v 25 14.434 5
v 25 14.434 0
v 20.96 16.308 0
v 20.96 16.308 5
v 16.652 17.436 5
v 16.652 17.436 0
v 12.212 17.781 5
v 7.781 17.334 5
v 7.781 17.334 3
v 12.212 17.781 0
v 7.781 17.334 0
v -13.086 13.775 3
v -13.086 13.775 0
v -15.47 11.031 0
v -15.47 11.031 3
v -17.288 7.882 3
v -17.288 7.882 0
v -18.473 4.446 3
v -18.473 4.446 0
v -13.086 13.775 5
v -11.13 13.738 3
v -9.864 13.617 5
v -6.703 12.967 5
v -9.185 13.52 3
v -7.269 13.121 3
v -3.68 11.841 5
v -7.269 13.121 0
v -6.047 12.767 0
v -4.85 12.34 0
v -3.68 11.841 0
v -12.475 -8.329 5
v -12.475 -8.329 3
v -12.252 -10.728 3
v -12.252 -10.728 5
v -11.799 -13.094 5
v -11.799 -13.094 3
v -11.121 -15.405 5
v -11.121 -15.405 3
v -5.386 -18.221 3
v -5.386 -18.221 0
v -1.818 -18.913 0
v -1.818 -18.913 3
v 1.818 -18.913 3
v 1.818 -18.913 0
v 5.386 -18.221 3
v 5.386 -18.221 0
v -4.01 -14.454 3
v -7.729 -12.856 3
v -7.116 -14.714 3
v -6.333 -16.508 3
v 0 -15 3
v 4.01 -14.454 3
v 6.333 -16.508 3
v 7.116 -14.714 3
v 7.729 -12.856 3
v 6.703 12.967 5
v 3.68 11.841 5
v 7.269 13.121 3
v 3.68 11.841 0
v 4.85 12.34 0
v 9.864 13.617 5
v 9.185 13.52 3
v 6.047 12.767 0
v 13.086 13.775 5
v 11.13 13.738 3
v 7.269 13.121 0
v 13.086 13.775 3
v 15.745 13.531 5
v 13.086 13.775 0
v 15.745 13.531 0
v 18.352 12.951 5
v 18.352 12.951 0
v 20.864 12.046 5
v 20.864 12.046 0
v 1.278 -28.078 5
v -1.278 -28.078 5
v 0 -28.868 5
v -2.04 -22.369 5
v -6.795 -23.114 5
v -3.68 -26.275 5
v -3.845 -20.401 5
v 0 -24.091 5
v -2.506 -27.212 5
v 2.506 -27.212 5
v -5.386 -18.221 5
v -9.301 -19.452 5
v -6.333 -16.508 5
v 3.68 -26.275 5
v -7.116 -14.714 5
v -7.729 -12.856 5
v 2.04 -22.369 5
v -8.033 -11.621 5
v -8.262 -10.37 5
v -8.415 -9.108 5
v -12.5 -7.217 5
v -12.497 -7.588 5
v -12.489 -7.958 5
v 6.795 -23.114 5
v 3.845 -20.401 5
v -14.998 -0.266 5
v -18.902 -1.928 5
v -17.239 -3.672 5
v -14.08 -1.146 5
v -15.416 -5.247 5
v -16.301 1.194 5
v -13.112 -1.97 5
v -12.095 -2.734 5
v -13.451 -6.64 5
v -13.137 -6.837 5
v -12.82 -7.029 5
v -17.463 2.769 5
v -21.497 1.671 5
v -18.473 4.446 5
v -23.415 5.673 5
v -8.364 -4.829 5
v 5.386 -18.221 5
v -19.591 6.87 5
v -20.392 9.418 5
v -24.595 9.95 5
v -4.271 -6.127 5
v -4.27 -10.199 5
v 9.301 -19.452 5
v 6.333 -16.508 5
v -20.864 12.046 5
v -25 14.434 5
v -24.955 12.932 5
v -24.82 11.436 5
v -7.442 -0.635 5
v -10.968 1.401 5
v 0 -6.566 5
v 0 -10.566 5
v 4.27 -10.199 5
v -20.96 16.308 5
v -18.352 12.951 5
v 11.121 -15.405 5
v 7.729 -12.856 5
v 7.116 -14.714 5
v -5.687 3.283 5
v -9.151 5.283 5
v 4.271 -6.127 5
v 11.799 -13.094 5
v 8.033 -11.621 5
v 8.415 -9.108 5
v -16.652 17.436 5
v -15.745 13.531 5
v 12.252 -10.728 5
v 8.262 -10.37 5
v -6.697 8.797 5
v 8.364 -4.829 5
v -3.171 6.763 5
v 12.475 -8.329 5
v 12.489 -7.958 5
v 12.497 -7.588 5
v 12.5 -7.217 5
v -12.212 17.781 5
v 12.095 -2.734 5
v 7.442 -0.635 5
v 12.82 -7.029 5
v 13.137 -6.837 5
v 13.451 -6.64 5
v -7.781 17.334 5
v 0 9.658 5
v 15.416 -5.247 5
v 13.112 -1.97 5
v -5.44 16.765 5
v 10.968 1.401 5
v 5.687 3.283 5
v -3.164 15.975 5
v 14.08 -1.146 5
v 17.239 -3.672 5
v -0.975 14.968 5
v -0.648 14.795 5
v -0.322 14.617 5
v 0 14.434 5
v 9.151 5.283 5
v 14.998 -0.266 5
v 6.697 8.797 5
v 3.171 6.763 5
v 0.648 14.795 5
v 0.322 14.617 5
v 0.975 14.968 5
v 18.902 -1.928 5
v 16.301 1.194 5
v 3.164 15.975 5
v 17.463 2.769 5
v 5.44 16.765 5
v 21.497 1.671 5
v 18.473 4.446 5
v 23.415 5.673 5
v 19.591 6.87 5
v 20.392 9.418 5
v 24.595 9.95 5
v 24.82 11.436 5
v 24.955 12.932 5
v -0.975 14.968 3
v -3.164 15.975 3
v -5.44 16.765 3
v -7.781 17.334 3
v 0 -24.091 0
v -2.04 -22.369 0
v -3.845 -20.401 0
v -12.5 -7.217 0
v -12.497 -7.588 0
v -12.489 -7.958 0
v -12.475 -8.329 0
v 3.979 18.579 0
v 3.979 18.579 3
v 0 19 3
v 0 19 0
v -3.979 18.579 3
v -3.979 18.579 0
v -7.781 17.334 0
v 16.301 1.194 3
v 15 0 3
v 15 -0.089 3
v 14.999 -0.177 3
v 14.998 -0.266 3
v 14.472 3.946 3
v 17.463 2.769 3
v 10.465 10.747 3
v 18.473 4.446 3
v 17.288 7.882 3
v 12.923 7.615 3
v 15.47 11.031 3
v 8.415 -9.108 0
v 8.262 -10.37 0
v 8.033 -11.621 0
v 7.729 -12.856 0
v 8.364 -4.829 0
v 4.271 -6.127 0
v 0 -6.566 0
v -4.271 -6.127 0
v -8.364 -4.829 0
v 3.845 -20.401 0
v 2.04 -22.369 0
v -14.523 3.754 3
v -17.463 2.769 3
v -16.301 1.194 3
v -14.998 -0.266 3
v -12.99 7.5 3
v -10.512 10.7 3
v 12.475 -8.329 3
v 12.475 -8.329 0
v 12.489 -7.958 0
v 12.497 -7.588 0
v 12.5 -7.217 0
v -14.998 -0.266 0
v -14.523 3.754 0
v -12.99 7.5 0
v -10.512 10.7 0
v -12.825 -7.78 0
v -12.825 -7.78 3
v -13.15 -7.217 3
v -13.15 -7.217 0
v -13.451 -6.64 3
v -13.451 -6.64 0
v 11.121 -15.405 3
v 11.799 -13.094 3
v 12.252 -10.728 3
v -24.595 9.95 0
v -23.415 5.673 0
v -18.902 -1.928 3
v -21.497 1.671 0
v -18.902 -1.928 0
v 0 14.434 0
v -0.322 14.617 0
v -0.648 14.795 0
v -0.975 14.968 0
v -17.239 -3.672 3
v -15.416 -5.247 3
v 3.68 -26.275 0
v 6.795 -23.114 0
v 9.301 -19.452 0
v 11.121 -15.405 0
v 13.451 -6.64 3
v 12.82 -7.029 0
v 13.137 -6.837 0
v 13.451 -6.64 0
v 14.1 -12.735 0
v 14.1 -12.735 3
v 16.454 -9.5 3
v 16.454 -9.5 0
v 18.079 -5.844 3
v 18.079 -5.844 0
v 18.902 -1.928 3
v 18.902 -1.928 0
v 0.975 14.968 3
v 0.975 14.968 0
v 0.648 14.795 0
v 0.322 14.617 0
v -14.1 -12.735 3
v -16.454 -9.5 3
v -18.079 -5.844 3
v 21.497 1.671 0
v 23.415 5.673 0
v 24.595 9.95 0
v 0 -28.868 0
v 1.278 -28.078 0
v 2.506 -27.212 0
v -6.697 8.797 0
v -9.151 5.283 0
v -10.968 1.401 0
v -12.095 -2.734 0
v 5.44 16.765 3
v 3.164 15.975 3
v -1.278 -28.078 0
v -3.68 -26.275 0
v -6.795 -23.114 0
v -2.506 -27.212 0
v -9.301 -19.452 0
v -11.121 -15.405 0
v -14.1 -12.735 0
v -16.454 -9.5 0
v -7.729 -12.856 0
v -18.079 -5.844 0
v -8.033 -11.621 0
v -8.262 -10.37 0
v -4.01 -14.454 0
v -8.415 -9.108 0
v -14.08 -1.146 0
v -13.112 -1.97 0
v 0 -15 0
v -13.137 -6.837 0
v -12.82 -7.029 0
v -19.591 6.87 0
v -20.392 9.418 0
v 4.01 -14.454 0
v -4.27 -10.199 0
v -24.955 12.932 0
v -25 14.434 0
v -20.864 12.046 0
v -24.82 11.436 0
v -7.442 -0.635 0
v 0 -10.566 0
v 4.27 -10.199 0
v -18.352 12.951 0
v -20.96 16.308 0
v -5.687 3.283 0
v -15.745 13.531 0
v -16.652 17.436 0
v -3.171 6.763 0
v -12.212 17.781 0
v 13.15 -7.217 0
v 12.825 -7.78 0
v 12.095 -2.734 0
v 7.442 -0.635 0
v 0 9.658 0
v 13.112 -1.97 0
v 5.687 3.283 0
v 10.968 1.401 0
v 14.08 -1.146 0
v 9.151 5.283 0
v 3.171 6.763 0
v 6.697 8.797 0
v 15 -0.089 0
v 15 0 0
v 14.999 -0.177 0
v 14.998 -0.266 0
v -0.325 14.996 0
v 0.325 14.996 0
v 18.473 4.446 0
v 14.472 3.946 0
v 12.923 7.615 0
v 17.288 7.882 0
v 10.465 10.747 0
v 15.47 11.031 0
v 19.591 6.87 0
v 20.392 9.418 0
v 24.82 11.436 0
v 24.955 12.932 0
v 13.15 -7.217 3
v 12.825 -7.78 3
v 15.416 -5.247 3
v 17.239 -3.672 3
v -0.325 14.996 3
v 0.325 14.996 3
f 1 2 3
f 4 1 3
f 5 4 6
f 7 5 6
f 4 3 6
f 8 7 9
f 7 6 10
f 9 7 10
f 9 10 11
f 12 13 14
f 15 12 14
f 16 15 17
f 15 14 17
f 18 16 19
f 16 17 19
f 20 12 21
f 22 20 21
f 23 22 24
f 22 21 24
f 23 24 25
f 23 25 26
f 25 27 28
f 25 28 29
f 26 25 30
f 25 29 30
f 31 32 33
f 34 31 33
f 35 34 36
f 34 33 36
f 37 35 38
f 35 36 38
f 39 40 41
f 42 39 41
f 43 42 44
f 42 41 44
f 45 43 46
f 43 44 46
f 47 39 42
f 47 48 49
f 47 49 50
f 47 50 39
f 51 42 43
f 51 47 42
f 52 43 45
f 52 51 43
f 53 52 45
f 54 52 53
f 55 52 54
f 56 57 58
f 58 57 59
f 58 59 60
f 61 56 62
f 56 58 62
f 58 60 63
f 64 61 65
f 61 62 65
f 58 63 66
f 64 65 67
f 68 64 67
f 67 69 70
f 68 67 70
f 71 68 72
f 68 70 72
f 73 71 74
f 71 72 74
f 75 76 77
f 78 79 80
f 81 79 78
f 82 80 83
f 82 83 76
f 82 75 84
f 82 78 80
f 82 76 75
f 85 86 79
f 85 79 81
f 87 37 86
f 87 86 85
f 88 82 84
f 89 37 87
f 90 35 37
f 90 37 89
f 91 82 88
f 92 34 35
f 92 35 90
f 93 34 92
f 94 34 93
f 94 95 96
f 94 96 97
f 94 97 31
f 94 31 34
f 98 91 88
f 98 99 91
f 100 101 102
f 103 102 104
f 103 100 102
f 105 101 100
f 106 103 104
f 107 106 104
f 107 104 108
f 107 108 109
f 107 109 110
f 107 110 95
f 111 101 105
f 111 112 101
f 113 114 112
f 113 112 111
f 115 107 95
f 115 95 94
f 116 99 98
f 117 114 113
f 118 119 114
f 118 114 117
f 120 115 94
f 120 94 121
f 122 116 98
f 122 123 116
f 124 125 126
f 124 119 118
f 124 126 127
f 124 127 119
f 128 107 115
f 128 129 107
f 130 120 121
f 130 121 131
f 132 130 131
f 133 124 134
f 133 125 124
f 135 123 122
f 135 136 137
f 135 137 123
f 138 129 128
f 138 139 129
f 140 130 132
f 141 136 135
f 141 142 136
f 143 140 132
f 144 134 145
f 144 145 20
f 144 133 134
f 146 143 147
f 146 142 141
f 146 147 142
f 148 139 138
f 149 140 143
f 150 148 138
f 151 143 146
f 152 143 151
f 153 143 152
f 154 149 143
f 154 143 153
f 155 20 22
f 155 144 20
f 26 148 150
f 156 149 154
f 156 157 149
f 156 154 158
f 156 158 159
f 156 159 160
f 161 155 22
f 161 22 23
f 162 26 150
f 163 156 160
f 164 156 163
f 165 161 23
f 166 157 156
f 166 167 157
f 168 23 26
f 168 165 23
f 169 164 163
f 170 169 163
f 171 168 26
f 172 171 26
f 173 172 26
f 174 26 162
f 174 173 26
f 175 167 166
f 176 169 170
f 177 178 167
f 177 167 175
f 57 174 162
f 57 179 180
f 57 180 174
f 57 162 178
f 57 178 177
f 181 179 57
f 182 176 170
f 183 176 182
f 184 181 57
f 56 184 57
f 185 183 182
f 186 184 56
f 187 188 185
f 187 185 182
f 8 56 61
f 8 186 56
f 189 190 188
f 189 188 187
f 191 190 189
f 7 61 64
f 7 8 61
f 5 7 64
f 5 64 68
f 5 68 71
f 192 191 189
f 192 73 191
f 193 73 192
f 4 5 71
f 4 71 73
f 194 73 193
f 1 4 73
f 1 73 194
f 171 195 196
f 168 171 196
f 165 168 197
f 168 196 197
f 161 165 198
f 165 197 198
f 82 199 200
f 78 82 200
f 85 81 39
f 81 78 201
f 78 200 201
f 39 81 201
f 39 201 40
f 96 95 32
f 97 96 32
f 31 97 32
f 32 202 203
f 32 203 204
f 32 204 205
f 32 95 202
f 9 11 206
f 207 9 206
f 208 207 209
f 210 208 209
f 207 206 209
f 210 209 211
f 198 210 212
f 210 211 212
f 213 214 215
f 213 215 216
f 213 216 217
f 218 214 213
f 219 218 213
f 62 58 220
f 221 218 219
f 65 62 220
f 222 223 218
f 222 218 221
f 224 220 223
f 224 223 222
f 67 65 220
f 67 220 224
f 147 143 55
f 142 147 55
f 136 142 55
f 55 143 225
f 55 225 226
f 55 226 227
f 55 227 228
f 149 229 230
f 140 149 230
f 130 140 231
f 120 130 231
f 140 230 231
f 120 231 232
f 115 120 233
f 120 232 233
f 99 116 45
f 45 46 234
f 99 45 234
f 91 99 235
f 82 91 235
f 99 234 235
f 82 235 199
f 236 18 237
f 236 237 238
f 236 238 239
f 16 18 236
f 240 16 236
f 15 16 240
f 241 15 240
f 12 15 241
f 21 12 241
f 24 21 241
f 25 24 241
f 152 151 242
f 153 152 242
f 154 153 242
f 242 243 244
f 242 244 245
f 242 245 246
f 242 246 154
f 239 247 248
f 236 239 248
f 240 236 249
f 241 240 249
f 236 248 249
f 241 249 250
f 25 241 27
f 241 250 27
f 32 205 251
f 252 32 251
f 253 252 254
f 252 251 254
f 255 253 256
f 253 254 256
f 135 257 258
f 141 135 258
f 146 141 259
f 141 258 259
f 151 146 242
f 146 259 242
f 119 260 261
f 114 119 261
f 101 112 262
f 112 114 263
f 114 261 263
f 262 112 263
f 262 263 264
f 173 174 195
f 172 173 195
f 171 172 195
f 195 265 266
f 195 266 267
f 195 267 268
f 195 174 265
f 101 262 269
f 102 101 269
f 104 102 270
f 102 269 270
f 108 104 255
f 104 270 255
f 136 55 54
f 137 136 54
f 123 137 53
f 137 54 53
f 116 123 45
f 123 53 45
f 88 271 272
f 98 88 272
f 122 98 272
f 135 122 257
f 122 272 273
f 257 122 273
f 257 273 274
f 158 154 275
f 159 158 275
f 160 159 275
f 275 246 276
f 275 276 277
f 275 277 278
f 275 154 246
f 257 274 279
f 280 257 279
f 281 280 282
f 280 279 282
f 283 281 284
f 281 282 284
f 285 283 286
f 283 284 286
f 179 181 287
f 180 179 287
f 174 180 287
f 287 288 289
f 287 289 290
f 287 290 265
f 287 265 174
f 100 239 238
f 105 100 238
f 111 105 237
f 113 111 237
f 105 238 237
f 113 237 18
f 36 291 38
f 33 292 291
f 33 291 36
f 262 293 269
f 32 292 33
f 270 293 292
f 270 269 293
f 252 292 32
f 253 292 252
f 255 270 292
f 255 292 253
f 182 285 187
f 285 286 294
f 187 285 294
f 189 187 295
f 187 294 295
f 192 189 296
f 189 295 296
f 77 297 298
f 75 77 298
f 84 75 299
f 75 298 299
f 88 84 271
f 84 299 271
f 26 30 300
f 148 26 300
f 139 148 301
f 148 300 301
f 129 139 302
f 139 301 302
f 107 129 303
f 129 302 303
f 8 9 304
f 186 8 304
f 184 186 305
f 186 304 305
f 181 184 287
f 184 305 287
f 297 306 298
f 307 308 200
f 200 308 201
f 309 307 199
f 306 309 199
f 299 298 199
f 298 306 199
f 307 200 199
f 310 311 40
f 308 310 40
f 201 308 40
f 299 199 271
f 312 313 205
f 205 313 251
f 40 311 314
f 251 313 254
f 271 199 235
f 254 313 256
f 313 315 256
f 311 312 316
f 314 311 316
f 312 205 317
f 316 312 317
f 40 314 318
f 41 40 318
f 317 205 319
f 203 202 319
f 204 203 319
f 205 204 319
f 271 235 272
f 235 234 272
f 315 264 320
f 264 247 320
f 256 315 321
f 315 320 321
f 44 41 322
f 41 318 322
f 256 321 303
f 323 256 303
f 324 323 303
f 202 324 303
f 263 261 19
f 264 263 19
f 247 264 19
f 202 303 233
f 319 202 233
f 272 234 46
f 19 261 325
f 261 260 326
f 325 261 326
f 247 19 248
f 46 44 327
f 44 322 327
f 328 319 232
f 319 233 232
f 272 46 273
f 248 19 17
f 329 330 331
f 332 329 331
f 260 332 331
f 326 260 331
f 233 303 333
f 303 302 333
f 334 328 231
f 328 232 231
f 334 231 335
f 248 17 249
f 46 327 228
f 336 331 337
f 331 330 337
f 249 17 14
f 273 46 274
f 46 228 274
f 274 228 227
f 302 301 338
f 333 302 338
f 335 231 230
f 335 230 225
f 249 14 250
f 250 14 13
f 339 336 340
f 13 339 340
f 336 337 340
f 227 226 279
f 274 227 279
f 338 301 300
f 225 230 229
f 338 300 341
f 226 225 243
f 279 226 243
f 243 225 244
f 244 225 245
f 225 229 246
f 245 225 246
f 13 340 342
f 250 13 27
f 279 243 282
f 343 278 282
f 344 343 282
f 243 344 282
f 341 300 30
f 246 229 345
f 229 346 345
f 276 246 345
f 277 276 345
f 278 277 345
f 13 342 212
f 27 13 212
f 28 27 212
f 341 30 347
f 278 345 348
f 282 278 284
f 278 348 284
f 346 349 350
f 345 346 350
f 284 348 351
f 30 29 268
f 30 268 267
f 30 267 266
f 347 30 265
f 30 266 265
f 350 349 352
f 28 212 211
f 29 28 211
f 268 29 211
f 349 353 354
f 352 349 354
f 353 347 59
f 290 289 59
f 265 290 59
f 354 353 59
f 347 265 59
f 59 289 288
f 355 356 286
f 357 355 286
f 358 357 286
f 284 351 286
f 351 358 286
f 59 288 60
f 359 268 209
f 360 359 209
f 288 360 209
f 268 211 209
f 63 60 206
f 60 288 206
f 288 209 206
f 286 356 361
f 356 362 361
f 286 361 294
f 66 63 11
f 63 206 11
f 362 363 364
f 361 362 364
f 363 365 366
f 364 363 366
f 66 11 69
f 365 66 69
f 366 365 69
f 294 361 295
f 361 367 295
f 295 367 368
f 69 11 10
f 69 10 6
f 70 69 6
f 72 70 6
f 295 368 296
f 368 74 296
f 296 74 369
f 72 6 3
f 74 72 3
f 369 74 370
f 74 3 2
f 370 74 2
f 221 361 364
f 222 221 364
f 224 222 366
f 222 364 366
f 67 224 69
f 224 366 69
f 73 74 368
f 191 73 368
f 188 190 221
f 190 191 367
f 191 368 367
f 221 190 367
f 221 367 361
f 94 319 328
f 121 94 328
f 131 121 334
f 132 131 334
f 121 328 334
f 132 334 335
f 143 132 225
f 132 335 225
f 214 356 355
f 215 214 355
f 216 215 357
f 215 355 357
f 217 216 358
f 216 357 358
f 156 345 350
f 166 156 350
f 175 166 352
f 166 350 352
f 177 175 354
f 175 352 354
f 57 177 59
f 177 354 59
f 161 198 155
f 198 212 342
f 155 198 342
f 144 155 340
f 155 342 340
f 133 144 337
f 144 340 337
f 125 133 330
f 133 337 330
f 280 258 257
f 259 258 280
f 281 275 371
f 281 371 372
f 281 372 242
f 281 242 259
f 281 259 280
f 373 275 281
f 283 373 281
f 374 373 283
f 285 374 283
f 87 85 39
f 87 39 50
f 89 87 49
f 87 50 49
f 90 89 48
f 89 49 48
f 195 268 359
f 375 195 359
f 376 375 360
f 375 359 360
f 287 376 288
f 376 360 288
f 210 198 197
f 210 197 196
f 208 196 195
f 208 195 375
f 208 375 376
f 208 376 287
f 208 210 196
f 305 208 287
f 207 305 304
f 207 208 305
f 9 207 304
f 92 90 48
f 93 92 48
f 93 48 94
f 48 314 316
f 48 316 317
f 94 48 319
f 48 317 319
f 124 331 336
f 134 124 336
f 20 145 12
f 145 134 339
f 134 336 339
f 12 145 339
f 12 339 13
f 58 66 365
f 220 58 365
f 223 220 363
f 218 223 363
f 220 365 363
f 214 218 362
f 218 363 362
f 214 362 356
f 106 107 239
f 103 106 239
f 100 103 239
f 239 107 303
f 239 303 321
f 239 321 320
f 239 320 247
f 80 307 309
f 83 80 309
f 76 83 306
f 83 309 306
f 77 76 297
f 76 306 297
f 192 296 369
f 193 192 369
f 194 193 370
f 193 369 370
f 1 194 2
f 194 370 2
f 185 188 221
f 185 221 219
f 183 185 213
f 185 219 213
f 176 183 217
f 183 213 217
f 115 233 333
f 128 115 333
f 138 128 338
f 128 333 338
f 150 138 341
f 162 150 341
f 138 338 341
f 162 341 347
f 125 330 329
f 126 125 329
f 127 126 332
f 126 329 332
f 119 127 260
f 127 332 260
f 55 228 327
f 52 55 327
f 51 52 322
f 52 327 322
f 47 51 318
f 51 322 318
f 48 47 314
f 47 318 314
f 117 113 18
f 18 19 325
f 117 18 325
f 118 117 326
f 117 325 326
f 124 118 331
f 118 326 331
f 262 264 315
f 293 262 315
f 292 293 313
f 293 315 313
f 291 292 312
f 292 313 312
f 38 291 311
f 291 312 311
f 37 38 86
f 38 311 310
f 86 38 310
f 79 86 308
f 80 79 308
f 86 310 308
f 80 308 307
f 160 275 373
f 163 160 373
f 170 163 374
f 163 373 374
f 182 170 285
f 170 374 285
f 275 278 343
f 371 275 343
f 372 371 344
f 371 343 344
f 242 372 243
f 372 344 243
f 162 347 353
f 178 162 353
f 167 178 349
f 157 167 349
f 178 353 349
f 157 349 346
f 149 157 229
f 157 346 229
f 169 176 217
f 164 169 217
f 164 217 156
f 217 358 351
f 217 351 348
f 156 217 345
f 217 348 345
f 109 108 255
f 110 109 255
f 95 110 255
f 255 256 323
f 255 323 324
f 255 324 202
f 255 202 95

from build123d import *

# Parameters (mm, degrees)
F1_DEPTH = 5
F2_DEPTH = 3


with BuildPart() as f1:
    # F0 (on Top) → F1 (new body)
    with BuildSketch(Plane.XY):
        with BuildLine():
            ThreePointArc((24.5947175074, 9.9504687923), (24.8984732231, 12.1829721649), (25, 14.4337567297))
            ThreePointArc((25, 14.4337567297), (23, 15.4712242442), (20.9147175074, 16.3244157642))
            ThreePointArc((20.9147175074, 16.3244157642), (20.9786685428, 15.3800474736), (21, 14.4337567297))
            ThreePointArc((21, 14.4337567297), (20.9659167777, 13.237791149), (20.8637777457, 12.0457076978))
            ThreePointArc((20.8637777457, 12.0457076978), (22.7827532073, 11.0933643008), (24.5947175074, 9.9504687923))
        make_face()
        with BuildLine():
            ThreePointArc((18.901890558, -1.9283498991), (22.544740222, 3.6293739003), (24.5947175074, 9.9504687923))
            ThreePointArc((24.5947175074, 9.9504687923), (22.7827532073, 11.0933643008), (20.8637777457, 12.0457076978))
            ThreePointArc((20.8637777457, 12.0457076978), (20.0319225906, 8.1312114245), (18.4725923104, 4.4455970728))
            ThreePointArc((18.4725923104, 4.4455970728), (18.8676873768, 2.2383862605), (19, 0))
            ThreePointArc((19, 0), (18.9754567877, -0.9654220315), (18.901890558, -1.9283498991))
        make_face()
        with BuildLine():
            ThreePointArc((13.4505266316, -6.6395280957), (16.3468200119, -4.4813556278), (18.901890558, -1.9283498991))
            ThreePointArc((18.901890558, -1.9283498991), (18.9754567877, -0.9654220315), (19, 0))
            ThreePointArc((19, 0), (18.8676873768, 2.2383862605), (18.4725923104, 4.4455970728))
            ThreePointArc((18.4725923104, 4.4455970728), (16.900090485, 1.9683268696), (14.9976487046, -0.2655811238))
            ThreePointArc((14.9976487046, -0.2655811238), (14.5767441491, -3.5381534747), (13.4505266316, -6.6395280957))
        make_face()
        with BuildLine():
            ThreePointArc((12.5, -7.2168783649), (12.9784741571, -6.9334894324), (13.4505266316, -6.6395280957))
            ThreePointArc((13.4505266316, -6.6395280957), (14.5767441491, -3.5381534747), (14.9976487046, -0.2655811238))
            ThreePointArc((14.9976487046, -0.2655811238), (13.6022734946, -1.5655606237), (12.0947175074, -2.7335904275))
            ThreePointArc((12.0947175074, -2.7335904275), (12.3984732231, -4.9660938001), (12.5, -7.2168783649))
        make_face()
        with BuildLine():
            ThreePointArc((8.4147175074, -9.1075373993), (10.5, -8.2543458793), (12.5, -7.2168783649))
            ThreePointArc((12.5, -7.2168783649), (12.3984732231, -4.9660938001), (12.0947175074, -2.7335904275))
            ThreePointArc((12.0947175074, -2.7335904275), (10.2827532073, -3.876485936), (8.3637777457, -4.8288293329))
            ThreePointArc((8.3637777457, -4.8288293329), (8.4659167777, -6.0209127841), (8.5, -7.2168783649))
            ThreePointArc((8.5, -7.2168783649), (8.4786685428, -8.1631691088), (8.4147175074, -9.1075373993))
        make_face()
        with BuildLine():
            ThreePointArc((-8.4147175074, -9.1075373993), (0, -10.5662432703), (8.4147175074, -9.1075373993))
            ThreePointArc((8.4147175074, -9.1075373993), (8.4786685428, -8.1631691088), (8.5, -7.2168783649))
            ThreePointArc((8.5, -7.2168783649), (8.4659167777, -6.0209127841), (8.3637777457, -4.8288293329))
            ThreePointArc((8.3637777457, -4.8288293329), (0, -6.5662432703), (-8.3637777457, -4.8288293329))
            ThreePointArc((-8.3637777457, -4.8288293329), (-8.4985119016, -6.9668825304), (-8.4147175074, -9.1075373993))
        make_face()
        with BuildLine():
            ThreePointArc((-12.0947175074, -2.7335904275), (-12.3984732231, -4.9660938001), (-12.5, -7.2168783649))
            ThreePointArc((-12.5, -7.2168783649), (-10.5, -8.2543458793), (-8.4147175074, -9.1075373993))
            ThreePointArc((-8.4147175074, -9.1075373993), (-8.4985119016, -6.9668825304), (-8.3637777457, -4.8288293329))
            ThreePointArc((-8.3637777457, -4.8288293329), (-10.2827532073, -3.876485936), (-12.0947175074, -2.7335904275))
        make_face()
        with BuildLine():
            ThreePointArc((-14.9976487046, -0.2655811238), (-14.5767441491, -3.5381534747), (-13.4505266316, -6.6395280957))
            ThreePointArc((-13.4505266316, -6.6395280957), (-12.9784741571, -6.9334894324), (-12.5, -7.2168783649))
            ThreePointArc((-12.5, -7.2168783649), (-12.3984732231, -4.9660938001), (-12.0947175074, -2.7335904275))
            ThreePointArc((-12.0947175074, -2.7335904275), (-13.6022734946, -1.5655606237), (-14.9976487046, -0.2655811238))
        make_face()
        with BuildLine():
            ThreePointArc((-18.4725923104, 4.4455970728), (-18.9570512586, 1.2767958254), (-18.901890558, -1.9283498991))
            ThreePointArc((-18.901890558, -1.9283498991), (-16.3468200119, -4.4813556278), (-13.4505266316, -6.6395280957))
            ThreePointArc((-13.4505266316, -6.6395280957), (-14.5767441491, -3.5381534747), (-14.9976487046, -0.2655811238))
            ThreePointArc((-14.9976487046, -0.2655811238), (-16.900090485, 1.9683268696), (-18.4725923104, 4.4455970728))
        make_face()
        with BuildLine():
            ThreePointArc((-20.8637777457, 12.0457076978), (-22.7827532073, 11.0933643008), (-24.5947175074, 9.9504687923))
            ThreePointArc((-24.5947175074, 9.9504687923), (-22.544740222, 3.6293739003), (-18.901890558, -1.9283498991))
            ThreePointArc((-18.901890558, -1.9283498991), (-18.9570512586, 1.2767958254), (-18.4725923104, 4.4455970728))
            ThreePointArc((-18.4725923104, 4.4455970728), (-20.0319225906, 8.1312114245), (-20.8637777457, 12.0457076978))
        make_face()
        with BuildLine():
            ThreePointArc((-20.9147175074, 16.3244157642), (-23, 15.4712242442), (-25, 14.4337567297))
            ThreePointArc((-25, 14.4337567297), (-24.8984732231, 12.1829721649), (-24.5947175074, 9.9504687923))
            ThreePointArc((-24.5947175074, 9.9504687923), (-22.7827532073, 11.0933643008), (-20.8637777457, 12.0457076978))
            ThreePointArc((-20.8637777457, 12.0457076978), (-20.9985119016, 14.1837608953), (-20.9147175074, 16.3244157642))
        make_face()
        with BuildLine():
            ThreePointArc((-7.780945279, 17.3336923523), (-14.4155001085, 17.7096308038), (-20.9147175074, 16.3244157642))
            ThreePointArc((-20.9147175074, 16.3244157642), (-20.9985119016, 14.1837608953), (-20.8637777457, 12.0457076978))
            ThreePointArc((-20.8637777457, 12.0457076978), (-17.0577969525, 13.2825481378), (-13.0862961552, 13.7749356782))
            ThreePointArc((-13.0862961552, 13.7749356782), (-10.5842632495, 15.7788900581), (-7.780945279, 17.3336923523))
        make_face()
        with BuildLine():
            ThreePointArc((-0.9752633158, 14.9682618051), (-4.2924421889, 16.3974392153), (-7.780945279, 17.3336923523))
            ThreePointArc((-7.780945279, 17.3336923523), (-10.5842632495, 15.7788900581), (-13.0862961552, 13.7749356782))
            ThreePointArc((-13.0862961552, 13.7749356782), (-10.1546663145, 13.6517442515), (-7.2688243523, 13.1211353371))
            ThreePointArc((-7.2688243523, 13.1211353371), (-4.224241283, 14.392907475), (-0.9752633158, 14.9682618051))
        make_face()
        with BuildLine():
            ThreePointArc((0, 14.4337567297), (-0.4846590933, 14.7064330386), (-0.9752633158, 14.9682618051))
            ThreePointArc((-0.9752633158, 14.9682618051), (-4.224241283, 14.392907475), (-7.2688243523, 13.1211353371))
            ThreePointArc((-7.2688243523, 13.1211353371), (-5.445321476, 12.5626947074), (-3.68, 11.8411278268))
            ThreePointArc((-3.68, 11.8411278268), (-1.8984732231, 13.2204396794), (0, 14.4337567297))
        make_face()
        with BuildLine():
            ThreePointArc((3.68, 11.8411278268), (1.8984732231, 13.2204396794), (0, 14.4337567297))
            ThreePointArc((0, 14.4337567297), (-1.8984732231, 13.2204396794), (-3.68, 11.8411278268))
            ThreePointArc((-3.68, 11.8411278268), (-1.7842413057, 10.8433684664), (0, 9.6576586658))
            ThreePointArc((0, 9.6576586658), (1.7842413057, 10.8433684664), (3.68, 11.8411278268))
        make_face()
        with BuildLine():
            ThreePointArc((8.3637777457, -4.8288293329), (10.2827532073, -3.876485936), (12.0947175074, -2.7335904275))
            ThreePointArc((12.0947175074, -2.7335904275), (9.1506350946, 5.2831216351), (3.68, 11.8411278268))
            ThreePointArc((3.68, 11.8411278268), (1.7842413057, 10.8433684664), (0, 9.6576586658))
            ThreePointArc((0, 9.6576586658), (5.6865334795, 3.2831216351), (8.3637777457, -4.8288293329))
        make_face()
        with BuildLine():
            ThreePointArc((12.4752633158, -8.3287337094), (12.4938150639, -7.7729436062), (12.5, -7.2168783649))
            ThreePointArc((12.5, -7.2168783649), (10.5, -8.2543458793), (8.4147175074, -9.1075373993))
            ThreePointArc((8.4147175074, -9.1075373993), (8.1569520186, -10.9971340837), (7.7288243523, -12.8555542133))
            ThreePointArc((7.7288243523, -12.8555542133), (10.3525028661, -10.8547540003), (12.4752633158, -8.3287337094))
        make_face()
        with BuildLine():
            ThreePointArc((5.3862961552, -18.2205327509), (8.3727880091, -17.0556858835), (11.120945279, -15.4053424532))
            ThreePointArc((11.120945279, -15.4053424532), (12.054377823, -11.9160835875), (12.4752633158, -8.3287337094))
            ThreePointArc((12.4752633158, -8.3287337094), (10.3525028661, -10.8547540003), (7.7288243523, -12.8555542133))
            ThreePointArc((7.7288243523, -12.8555542133), (6.7454241705, -15.620071121), (5.3862961552, -18.2205327509))
        make_face()
        with BuildLine():
            ThreePointArc((0, -24.0914153956), (1.7842413057, -25.2771251961), (3.68, -26.2748845565))
            ThreePointArc((3.68, -26.2748845565), (8.1292401135, -21.3390047041), (11.120945279, -15.4053424532))
            ThreePointArc((11.120945279, -15.4053424532), (8.3727880091, -17.0556858835), (5.3862961552, -18.2205327509))
            ThreePointArc((5.3862961552, -18.2205327509), (2.9741256381, -21.4137595623), (0, -24.0914153956))
        make_face()
        with BuildLine():
            ThreePointArc((-3.68, -26.2748845565), (-1.8984732231, -27.6541964091), (0, -28.8675134595))
            ThreePointArc((0, -28.8675134595), (1.8984732231, -27.6541964091), (3.68, -26.2748845565))
            ThreePointArc((3.68, -26.2748845565), (1.7842413057, -25.2771251961), (0, -24.0914153956))
            ThreePointArc((0, -24.0914153956), (-1.7842413057, -25.2771251961), (-3.68, -26.2748845565))
        make_face()
        with BuildLine():
            ThreePointArc((-11.120945279, -15.4053424532), (-8.1292401135, -21.3390047041), (-3.68, -26.2748845565))
            ThreePointArc((-3.68, -26.2748845565), (-1.7842413057, -25.2771251961), (0, -24.0914153956))
            ThreePointArc((0, -24.0914153956), (-2.9741256381, -21.4137595624), (-5.3862961552, -18.220532751))
            ThreePointArc((-5.3862961552, -18.2205327509), (-8.3727880091, -17.0556858835), (-11.120945279, -15.4053424532))
        make_face()
        with BuildLine():
            ThreePointArc((-12.4752633158, -8.3287337094), (-12.054377823, -11.9160835875), (-11.120945279, -15.4053424532))
            ThreePointArc((-11.120945279, -15.4053424532), (-8.3727880091, -17.0556858835), (-5.3862961552, -18.2205327509))
            ThreePointArc((-5.3862961552, -18.220532751), (-6.7454241705, -15.620071121), (-7.7288243523, -12.8555542133))
            ThreePointArc((-7.7288243523, -12.8555542133), (-10.3525028661, -10.8547540003), (-12.4752633158, -8.3287337094))
        make_face()
        with BuildLine():
            ThreePointArc((-8.4147175074, -9.1075373993), (-10.5, -8.2543458793), (-12.5, -7.2168783649))
            ThreePointArc((-12.5, -7.2168783649), (-12.4938150639, -7.7729436062), (-12.4752633158, -8.3287337094))
            ThreePointArc((-12.4752633158, -8.3287337094), (-10.3525028661, -10.8547540003), (-7.7288243523, -12.8555542133))
            ThreePointArc((-7.7288243523, -12.8555542133), (-8.1569520186, -10.9971340837), (-8.4147175074, -9.1075373993))
        make_face()
        with BuildLine():
            ThreePointArc((0, 9.6576586658), (-1.7842413057, 10.8433684664), (-3.68, 11.8411278268))
            ThreePointArc((-3.68, 11.8411278268), (-9.1506350946, 5.2831216351), (-12.0947175074, -2.7335904275))
            ThreePointArc((-12.0947175074, -2.7335904275), (-10.2827532073, -3.876485936), (-8.3637777457, -4.8288293329))
            ThreePointArc((-8.3637777457, -4.8288293329), (-5.6865334795, 3.2831216351), (0, 9.6576586658))
        make_face()
        with BuildLine():
            ThreePointArc((7.2688243523, 13.1211353371), (4.224241283, 14.392907475), (0.9752633158, 14.9682618051))
            ThreePointArc((0.9752633158, 14.9682618051), (0.4846590933, 14.7064330386), (0, 14.4337567297))
            ThreePointArc((0, 14.4337567297), (1.8984732231, 13.2204396794), (3.68, 11.8411278268))
            ThreePointArc((3.68, 11.8411278268), (5.445321476, 12.5626947074), (7.2688243523, 13.1211353371))
        make_face()
        with BuildLine():
            ThreePointArc((13.0862961552, 13.7749356782), (10.5842632495, 15.7788900581), (7.780945279, 17.3336923523))
            ThreePointArc((7.780945279, 17.3336923523), (4.2924421889, 16.3974392153), (0.9752633158, 14.9682618051))
            ThreePointArc((0.9752633158, 14.9682618051), (4.224241283, 14.392907475), (7.2688243523, 13.1211353371))
            ThreePointArc((7.2688243523, 13.1211353371), (10.1546663145, 13.6517442515), (13.0862961552, 13.7749356782))
        make_face()
        with BuildLine():
            ThreePointArc((21, 14.4337567297), (20.9786685428, 15.3800474736), (20.9147175074, 16.3244157642))
            ThreePointArc((20.9147175074, 16.3244157642), (14.4155001085, 17.7096308038), (7.780945279, 17.3336923523))
            ThreePointArc((7.780945279, 17.3336923523), (10.5842632495, 15.7788900581), (13.0862961552, 13.7749356782))
            ThreePointArc((13.0862961552, 13.7749356782), (17.0577969525, 13.2825481378), (20.8637777457, 12.0457076978))
            ThreePointArc((20.8637777457, 12.0457076978), (20.9659167777, 13.237791149), (21, 14.4337567297))
        make_face()
    extrude(amount=F1_DEPTH)

    # F0 (on Top) → F2 (join)
    with BuildSketch(Plane.XY):
        with BuildLine():
            ThreePointArc((0.9752633158, 14.9682618051), (4.2924421889, 16.3974392153), (7.780945279, 17.3336923523))
            ThreePointArc((7.780945279, 17.3336923523), (0, 19), (-7.780945279, 17.3336923523))
            ThreePointArc((-7.780945279, 17.3336923523), (-4.2924421889, 16.3974392153), (-0.9752633158, 14.9682618051))
            ThreePointArc((-0.9752633158, 14.9682618051), (0, 15), (0.9752633158, 14.9682618051))
        make_face()
        with BuildLine():
            ThreePointArc((14.9976487046, -0.2655811238), (16.900090485, 1.9683268696), (18.4725923104, 4.4455970728))
            ThreePointArc((18.4725923104, 4.4455970728), (16.4544826719, 9.5), (13.0862961552, 13.7749356782))
            ThreePointArc((13.0862961552, 13.7749356782), (10.1546663145, 13.6517442515), (7.2688243523, 13.1211353371))
            ThreePointArc((7.2688243523, 13.1211353371), (12.9234740934, 7.6147105892), (15, 0))
            ThreePointArc((15, 0), (14.9994121646, -0.132795766), (14.9976487046, -0.2655811238))
        make_face()
        with BuildLine():
            ThreePointArc((11.120945279, -15.4053424532), (16.4544826719, -9.5), (18.901890558, -1.9283498991))
            ThreePointArc((18.901890558, -1.9283498991), (16.3468200119, -4.4813556278), (13.4505266316, -6.6395280957))
            ThreePointArc((13.4505266316, -6.6395280957), (12.9903810568, -7.5), (12.4752633158, -8.3287337094))
            ThreePointArc((12.4752633158, -8.3287337094), (12.054377823, -11.9160835875), (11.120945279, -15.4053424532))
        make_face()
        with BuildLine():
            ThreePointArc((-5.3862961552, -18.2205327509), (0, -19), (5.3862961552, -18.2205327509))
            ThreePointArc((5.3862961552, -18.2205327509), (6.7454241705, -15.620071121), (7.7288243523, -12.8555542133))
            ThreePointArc((7.7288243523, -12.8555542133), (0, -15), (-7.7288243523, -12.8555542133))
            ThreePointArc((-7.7288243523, -12.8555542133), (-6.7454241705, -15.620071121), (-5.3862961552, -18.220532751))
        make_face()
        with BuildLine():
            ThreePointArc((-13.4505266316, -6.6395280957), (-16.3468200119, -4.4813556278), (-18.901890558, -1.9283498991))
            ThreePointArc((-18.901890558, -1.9283498991), (-16.4544826719, -9.5), (-11.120945279, -15.4053424532))
            ThreePointArc((-11.120945279, -15.4053424532), (-12.054377823, -11.9160835875), (-12.4752633158, -8.3287337094))
            ThreePointArc((-12.4752633158, -8.3287337094), (-12.9903810568, -7.5), (-13.4505266316, -6.6395280957))
        make_face()
        with BuildLine():
            ThreePointArc((-13.0862961552, 13.7749356782), (-16.4544826719, 9.5), (-18.4725923104, 4.4455970728))
            ThreePointArc((-18.4725923104, 4.4455970728), (-16.900090485, 1.9683268696), (-14.9976487046, -0.2655811238))
            ThreePointArc((-14.9976487046, -0.2655811238), (-12.9903810568, 7.5), (-7.2688243523, 13.1211353371))
            ThreePointArc((-7.2688243523, 13.1211353371), (-10.1546663145, 13.6517442515), (-13.0862961552, 13.7749356782))
        make_face()
    extrude(amount=F2_DEPTH)


solid = f1.part
